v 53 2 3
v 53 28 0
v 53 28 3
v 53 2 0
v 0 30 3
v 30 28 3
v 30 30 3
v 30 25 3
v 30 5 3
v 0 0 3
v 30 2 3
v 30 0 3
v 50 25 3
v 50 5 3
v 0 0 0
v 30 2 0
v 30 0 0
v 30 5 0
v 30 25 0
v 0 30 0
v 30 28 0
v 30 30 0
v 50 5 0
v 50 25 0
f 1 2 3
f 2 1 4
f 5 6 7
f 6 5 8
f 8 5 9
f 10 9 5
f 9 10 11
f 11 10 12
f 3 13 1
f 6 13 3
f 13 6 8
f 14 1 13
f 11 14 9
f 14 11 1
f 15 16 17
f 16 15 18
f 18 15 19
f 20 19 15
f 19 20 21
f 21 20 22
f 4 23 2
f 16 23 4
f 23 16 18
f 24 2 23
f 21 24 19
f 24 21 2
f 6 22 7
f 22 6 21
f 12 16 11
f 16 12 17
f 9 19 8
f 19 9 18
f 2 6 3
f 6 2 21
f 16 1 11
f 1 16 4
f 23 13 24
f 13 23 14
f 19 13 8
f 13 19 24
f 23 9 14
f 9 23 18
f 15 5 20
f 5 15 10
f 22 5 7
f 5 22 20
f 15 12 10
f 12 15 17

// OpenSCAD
plateWidth = 30;
hookWidth = 3;
gapWidth = 20;
buttressHeight = 5;
wedgeWidth = 10;

cube ([plateWidth, plateWidth, hookWidth]);

translate ([plateWidth, (plateWidth - (gapWidth + (2 * hookWidth))) / 2, 0]) {
    difference () {
        cube ([gapWidth + hookWidth, gapWidth + (2 * hookWidth), hookWidth]);

        translate ([0, hookWidth, -hookWidth]) {
            cube ([gapWidth, gapWidth, hookWidth * 2]);
        }
    }
}

translate ([plateWidth + gapWidth + hookWidth, (plateWidth - (gapWidth + (2 * hookWidth))) / 2, 0]) {
    linear_extrude(height=wedgeWidth, center=false, convexity=100, twist=0) {
        rotate ([90,0,0]) {
            polygon(points=[
                [0,0],
                [0,wedgeWidth],
                [wedgeWidth, 0]
            ], paths=[
                [0, 1, 2]
            ]);
        }
    }
}
